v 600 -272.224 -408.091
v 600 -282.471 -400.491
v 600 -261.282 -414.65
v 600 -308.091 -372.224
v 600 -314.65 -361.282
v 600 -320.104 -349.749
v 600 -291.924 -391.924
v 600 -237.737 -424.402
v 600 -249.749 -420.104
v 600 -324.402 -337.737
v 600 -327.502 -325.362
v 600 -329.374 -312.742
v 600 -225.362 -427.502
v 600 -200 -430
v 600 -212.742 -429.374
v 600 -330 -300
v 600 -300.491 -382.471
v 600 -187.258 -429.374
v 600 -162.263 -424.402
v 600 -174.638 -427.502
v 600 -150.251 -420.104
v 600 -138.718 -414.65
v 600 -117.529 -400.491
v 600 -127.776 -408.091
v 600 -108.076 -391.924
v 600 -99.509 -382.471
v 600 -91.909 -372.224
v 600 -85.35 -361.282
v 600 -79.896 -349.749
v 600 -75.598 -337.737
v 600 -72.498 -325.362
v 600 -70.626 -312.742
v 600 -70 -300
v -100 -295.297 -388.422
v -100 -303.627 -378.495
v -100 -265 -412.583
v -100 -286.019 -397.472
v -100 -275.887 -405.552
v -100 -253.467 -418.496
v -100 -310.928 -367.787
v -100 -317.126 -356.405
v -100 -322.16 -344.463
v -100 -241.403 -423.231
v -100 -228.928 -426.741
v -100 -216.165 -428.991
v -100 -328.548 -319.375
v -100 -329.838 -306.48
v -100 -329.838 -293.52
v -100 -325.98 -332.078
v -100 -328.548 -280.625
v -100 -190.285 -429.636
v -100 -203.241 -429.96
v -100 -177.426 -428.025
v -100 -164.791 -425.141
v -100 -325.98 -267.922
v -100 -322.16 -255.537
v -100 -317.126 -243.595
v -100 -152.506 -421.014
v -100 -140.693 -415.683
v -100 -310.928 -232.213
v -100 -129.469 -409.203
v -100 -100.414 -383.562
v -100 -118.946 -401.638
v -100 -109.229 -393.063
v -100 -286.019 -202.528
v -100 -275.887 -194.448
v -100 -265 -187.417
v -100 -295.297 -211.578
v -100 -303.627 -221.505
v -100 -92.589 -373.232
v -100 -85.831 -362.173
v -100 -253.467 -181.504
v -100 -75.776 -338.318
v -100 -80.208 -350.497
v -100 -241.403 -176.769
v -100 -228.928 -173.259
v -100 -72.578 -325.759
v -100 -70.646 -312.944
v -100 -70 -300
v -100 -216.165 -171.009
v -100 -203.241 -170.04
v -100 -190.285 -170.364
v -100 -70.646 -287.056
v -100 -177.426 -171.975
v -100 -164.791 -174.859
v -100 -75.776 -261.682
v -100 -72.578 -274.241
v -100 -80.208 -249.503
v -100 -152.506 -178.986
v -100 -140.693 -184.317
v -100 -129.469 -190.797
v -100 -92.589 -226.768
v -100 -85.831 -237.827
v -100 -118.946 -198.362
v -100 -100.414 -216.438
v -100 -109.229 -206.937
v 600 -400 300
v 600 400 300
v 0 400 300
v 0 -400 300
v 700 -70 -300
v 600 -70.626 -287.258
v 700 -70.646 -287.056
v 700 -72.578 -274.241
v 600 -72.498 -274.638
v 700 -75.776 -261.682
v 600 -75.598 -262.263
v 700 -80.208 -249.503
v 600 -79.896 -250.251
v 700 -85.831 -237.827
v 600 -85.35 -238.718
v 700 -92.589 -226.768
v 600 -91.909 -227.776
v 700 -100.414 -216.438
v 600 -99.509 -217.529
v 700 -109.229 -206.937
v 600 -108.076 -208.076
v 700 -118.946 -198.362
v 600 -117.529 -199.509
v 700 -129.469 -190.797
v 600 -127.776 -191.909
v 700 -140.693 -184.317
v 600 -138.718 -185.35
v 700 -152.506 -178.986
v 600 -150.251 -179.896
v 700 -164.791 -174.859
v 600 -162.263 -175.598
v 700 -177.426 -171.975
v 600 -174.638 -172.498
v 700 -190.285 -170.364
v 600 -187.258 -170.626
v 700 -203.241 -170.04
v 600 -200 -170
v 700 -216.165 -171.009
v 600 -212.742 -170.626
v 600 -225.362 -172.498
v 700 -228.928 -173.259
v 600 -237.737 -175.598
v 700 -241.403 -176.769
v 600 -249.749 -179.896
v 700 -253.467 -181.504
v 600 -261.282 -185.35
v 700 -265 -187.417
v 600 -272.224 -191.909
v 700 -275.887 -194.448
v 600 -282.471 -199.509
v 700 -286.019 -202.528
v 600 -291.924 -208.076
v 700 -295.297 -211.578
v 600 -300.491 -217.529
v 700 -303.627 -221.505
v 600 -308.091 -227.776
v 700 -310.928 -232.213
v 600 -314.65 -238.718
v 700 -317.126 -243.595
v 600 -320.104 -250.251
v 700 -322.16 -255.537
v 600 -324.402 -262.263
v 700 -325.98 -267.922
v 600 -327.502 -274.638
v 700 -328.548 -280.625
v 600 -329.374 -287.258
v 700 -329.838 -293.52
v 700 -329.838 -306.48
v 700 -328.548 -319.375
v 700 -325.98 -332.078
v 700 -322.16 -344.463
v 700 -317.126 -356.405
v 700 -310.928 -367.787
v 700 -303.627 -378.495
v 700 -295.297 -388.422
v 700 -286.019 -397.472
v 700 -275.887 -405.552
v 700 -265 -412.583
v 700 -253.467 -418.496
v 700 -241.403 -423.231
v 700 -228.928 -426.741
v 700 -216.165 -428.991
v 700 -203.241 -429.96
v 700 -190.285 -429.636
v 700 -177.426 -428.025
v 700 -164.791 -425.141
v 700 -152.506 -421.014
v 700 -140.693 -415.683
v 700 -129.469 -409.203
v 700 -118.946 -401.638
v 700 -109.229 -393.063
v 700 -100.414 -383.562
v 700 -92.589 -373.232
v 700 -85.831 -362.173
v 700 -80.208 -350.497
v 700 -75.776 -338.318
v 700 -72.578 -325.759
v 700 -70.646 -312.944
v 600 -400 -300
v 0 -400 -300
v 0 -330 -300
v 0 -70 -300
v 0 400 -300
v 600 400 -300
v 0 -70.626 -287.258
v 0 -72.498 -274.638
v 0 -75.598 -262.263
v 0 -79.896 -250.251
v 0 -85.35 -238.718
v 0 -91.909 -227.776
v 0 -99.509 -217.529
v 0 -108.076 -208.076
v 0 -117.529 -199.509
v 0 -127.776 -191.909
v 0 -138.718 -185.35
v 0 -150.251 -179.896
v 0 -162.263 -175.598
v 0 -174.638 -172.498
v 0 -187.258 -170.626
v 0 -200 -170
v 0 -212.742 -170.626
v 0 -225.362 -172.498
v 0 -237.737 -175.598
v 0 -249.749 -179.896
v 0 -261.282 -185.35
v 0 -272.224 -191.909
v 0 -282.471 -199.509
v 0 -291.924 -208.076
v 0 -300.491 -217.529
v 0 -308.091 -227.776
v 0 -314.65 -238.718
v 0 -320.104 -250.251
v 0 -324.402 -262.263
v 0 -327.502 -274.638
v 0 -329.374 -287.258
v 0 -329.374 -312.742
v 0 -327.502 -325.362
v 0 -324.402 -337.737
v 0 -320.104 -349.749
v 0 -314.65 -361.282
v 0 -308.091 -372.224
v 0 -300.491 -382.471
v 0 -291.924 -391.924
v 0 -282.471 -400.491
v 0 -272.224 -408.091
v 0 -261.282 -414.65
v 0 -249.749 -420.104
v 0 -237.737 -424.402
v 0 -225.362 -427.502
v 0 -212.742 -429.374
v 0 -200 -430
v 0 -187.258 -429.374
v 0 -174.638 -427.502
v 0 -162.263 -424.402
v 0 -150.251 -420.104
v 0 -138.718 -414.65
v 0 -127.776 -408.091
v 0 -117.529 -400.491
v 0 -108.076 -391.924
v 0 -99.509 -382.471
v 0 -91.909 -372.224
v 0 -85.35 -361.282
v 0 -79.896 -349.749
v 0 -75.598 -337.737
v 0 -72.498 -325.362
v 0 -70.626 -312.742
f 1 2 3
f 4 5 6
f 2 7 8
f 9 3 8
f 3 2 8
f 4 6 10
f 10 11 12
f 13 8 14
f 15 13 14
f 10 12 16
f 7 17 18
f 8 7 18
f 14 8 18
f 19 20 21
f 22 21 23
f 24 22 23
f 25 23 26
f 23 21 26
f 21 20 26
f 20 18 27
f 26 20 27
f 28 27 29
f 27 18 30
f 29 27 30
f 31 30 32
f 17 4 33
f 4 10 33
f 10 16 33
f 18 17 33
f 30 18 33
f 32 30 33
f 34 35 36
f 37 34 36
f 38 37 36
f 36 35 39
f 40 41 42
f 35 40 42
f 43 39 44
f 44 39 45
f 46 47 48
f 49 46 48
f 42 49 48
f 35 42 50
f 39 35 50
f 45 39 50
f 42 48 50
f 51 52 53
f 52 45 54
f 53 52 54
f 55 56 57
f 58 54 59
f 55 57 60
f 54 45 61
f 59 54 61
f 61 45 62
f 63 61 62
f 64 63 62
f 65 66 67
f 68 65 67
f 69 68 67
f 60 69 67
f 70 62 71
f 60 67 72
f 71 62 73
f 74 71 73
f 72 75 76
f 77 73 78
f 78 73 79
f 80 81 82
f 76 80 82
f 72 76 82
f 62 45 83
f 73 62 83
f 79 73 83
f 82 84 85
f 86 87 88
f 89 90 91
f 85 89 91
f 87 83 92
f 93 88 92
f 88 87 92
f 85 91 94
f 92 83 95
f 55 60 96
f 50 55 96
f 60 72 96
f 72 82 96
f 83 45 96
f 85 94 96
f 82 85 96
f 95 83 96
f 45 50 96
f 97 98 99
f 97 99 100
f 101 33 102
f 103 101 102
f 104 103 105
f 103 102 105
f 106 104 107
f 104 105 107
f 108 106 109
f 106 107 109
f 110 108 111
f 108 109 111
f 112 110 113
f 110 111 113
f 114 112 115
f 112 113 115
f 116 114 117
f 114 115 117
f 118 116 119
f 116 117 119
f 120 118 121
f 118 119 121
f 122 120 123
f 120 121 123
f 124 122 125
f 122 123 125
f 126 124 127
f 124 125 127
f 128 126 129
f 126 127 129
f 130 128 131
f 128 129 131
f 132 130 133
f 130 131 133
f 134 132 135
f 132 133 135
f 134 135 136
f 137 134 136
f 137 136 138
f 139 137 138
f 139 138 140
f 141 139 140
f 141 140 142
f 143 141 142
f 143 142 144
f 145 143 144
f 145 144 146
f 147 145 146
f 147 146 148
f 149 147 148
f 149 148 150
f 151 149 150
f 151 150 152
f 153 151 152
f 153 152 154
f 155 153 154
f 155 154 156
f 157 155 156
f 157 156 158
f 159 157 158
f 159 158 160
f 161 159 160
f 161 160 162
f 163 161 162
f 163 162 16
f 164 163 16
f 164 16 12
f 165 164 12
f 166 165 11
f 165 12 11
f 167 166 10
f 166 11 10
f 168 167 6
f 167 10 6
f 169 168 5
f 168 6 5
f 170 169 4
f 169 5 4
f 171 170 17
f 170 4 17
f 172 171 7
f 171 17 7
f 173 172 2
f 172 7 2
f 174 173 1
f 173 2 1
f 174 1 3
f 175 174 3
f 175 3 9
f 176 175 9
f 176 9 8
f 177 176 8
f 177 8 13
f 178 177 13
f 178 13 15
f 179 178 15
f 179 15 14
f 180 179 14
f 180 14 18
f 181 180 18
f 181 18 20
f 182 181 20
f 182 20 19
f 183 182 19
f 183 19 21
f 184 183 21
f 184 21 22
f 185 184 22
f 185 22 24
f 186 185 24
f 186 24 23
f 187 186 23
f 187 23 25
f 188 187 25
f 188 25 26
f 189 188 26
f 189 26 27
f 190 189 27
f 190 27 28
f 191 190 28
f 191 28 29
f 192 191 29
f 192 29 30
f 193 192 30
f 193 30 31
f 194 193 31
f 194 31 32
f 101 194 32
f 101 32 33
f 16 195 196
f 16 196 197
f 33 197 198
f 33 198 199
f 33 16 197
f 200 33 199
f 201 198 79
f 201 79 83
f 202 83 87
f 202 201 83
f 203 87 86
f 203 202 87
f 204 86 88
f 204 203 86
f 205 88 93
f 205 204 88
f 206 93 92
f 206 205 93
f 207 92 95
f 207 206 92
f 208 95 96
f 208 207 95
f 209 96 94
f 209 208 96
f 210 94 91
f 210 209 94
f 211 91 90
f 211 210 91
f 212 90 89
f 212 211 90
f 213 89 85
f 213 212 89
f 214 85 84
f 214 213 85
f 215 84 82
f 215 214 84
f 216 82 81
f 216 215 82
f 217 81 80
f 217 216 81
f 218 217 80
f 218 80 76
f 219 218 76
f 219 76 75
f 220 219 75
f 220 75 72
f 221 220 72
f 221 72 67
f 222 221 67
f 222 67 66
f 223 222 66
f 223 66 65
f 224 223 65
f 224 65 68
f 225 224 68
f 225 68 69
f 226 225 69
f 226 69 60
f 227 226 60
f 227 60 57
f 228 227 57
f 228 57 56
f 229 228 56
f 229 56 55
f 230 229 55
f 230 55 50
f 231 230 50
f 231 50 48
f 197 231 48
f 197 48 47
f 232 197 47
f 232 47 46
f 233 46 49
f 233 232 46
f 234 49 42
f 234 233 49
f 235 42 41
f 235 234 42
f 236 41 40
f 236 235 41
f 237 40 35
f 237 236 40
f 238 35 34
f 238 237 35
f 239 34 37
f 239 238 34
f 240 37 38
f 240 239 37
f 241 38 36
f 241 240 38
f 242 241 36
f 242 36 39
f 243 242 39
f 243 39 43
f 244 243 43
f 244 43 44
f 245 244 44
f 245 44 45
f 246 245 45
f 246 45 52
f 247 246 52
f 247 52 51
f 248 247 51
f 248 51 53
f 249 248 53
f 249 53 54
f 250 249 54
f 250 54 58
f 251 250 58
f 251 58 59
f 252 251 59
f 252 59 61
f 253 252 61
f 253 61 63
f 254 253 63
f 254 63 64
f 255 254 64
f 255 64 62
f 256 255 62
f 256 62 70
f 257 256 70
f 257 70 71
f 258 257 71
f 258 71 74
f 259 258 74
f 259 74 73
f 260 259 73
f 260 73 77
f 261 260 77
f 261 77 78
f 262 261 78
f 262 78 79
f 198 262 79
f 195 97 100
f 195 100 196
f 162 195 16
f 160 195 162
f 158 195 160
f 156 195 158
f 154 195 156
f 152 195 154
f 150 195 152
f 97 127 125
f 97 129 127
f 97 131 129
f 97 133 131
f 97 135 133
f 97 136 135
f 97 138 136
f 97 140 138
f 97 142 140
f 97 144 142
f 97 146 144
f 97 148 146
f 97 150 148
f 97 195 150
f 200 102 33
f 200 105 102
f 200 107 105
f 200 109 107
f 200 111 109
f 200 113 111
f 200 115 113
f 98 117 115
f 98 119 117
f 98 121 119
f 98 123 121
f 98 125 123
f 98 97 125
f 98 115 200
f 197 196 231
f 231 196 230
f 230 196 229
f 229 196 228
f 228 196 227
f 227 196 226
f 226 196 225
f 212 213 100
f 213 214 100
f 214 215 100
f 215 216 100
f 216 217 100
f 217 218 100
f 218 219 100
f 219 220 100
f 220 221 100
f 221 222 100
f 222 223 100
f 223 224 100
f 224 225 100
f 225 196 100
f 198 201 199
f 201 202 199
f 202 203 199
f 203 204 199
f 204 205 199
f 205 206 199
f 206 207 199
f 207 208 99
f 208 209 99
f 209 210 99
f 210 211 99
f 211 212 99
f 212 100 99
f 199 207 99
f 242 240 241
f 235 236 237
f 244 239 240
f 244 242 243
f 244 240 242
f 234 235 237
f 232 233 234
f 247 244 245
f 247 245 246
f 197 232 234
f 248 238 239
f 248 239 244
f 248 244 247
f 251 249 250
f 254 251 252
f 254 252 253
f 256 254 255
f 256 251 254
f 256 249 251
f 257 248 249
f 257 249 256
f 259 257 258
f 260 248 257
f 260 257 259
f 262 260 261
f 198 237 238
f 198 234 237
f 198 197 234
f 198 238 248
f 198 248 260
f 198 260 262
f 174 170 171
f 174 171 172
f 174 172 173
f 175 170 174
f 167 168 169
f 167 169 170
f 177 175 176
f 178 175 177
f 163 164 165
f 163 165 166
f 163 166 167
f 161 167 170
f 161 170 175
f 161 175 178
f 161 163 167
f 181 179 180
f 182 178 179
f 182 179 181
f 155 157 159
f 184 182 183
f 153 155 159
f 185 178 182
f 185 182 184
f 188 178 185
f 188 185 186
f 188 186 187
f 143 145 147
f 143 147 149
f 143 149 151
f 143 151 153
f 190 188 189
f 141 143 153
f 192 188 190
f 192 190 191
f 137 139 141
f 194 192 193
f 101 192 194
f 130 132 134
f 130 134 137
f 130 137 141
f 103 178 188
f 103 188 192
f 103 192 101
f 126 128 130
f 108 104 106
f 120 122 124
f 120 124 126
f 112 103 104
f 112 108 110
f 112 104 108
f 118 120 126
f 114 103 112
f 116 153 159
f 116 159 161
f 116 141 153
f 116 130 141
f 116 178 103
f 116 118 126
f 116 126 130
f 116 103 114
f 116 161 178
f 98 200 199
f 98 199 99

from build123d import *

# Parameters (mm, degrees)
F3_DEPTH = 560
F4_DEPTH = 100


with BuildPart() as f3:
    # F2 (on Right) → F3 (new body)
    with BuildSketch(Plane.YZ):
        with BuildLine():
            Line((-70, -300), (400, -300))
            Line((400, -300), (400, 300))
            Line((400, 300), (-400, 300))
            Line((-400, 300), (-400, -300))
            Line((-400, -300), (-330, -300))
            ThreePointArc((-330, -300), (-200, -170), (-70, -300))
        make_face()
        with BuildLine():
            Line((-330, -300), (-70, -300))
            ThreePointArc((-70, -300), (-200, -170), (-330, -300))
        make_face()
    extrude(amount=F3_DEPTH)

    # F2 (on Right) → F4 (join)
    with BuildSketch(Plane.YZ):
        with BuildLine():
            ThreePointArc((-330, -300), (-200, -430), (-70, -300))
            Line((-70, -300), (-330, -300))
        make_face()
        with BuildLine():
            Line((-330, -300), (-70, -300))
            ThreePointArc((-70, -300), (-200, -170), (-330, -300))
        make_face()
    extrude(amount=-F4_DEPTH)

    # F6: F3 across plane


with BuildPart() as f3_1:
    add(f3.part)
    add(f3.part.mirror(Plane(origin=(300, 11.7085678948, 14.3328259835), x_dir=(0, 1, 0), z_dir=(-1, 0, 0))))


solid = f3_1.part
